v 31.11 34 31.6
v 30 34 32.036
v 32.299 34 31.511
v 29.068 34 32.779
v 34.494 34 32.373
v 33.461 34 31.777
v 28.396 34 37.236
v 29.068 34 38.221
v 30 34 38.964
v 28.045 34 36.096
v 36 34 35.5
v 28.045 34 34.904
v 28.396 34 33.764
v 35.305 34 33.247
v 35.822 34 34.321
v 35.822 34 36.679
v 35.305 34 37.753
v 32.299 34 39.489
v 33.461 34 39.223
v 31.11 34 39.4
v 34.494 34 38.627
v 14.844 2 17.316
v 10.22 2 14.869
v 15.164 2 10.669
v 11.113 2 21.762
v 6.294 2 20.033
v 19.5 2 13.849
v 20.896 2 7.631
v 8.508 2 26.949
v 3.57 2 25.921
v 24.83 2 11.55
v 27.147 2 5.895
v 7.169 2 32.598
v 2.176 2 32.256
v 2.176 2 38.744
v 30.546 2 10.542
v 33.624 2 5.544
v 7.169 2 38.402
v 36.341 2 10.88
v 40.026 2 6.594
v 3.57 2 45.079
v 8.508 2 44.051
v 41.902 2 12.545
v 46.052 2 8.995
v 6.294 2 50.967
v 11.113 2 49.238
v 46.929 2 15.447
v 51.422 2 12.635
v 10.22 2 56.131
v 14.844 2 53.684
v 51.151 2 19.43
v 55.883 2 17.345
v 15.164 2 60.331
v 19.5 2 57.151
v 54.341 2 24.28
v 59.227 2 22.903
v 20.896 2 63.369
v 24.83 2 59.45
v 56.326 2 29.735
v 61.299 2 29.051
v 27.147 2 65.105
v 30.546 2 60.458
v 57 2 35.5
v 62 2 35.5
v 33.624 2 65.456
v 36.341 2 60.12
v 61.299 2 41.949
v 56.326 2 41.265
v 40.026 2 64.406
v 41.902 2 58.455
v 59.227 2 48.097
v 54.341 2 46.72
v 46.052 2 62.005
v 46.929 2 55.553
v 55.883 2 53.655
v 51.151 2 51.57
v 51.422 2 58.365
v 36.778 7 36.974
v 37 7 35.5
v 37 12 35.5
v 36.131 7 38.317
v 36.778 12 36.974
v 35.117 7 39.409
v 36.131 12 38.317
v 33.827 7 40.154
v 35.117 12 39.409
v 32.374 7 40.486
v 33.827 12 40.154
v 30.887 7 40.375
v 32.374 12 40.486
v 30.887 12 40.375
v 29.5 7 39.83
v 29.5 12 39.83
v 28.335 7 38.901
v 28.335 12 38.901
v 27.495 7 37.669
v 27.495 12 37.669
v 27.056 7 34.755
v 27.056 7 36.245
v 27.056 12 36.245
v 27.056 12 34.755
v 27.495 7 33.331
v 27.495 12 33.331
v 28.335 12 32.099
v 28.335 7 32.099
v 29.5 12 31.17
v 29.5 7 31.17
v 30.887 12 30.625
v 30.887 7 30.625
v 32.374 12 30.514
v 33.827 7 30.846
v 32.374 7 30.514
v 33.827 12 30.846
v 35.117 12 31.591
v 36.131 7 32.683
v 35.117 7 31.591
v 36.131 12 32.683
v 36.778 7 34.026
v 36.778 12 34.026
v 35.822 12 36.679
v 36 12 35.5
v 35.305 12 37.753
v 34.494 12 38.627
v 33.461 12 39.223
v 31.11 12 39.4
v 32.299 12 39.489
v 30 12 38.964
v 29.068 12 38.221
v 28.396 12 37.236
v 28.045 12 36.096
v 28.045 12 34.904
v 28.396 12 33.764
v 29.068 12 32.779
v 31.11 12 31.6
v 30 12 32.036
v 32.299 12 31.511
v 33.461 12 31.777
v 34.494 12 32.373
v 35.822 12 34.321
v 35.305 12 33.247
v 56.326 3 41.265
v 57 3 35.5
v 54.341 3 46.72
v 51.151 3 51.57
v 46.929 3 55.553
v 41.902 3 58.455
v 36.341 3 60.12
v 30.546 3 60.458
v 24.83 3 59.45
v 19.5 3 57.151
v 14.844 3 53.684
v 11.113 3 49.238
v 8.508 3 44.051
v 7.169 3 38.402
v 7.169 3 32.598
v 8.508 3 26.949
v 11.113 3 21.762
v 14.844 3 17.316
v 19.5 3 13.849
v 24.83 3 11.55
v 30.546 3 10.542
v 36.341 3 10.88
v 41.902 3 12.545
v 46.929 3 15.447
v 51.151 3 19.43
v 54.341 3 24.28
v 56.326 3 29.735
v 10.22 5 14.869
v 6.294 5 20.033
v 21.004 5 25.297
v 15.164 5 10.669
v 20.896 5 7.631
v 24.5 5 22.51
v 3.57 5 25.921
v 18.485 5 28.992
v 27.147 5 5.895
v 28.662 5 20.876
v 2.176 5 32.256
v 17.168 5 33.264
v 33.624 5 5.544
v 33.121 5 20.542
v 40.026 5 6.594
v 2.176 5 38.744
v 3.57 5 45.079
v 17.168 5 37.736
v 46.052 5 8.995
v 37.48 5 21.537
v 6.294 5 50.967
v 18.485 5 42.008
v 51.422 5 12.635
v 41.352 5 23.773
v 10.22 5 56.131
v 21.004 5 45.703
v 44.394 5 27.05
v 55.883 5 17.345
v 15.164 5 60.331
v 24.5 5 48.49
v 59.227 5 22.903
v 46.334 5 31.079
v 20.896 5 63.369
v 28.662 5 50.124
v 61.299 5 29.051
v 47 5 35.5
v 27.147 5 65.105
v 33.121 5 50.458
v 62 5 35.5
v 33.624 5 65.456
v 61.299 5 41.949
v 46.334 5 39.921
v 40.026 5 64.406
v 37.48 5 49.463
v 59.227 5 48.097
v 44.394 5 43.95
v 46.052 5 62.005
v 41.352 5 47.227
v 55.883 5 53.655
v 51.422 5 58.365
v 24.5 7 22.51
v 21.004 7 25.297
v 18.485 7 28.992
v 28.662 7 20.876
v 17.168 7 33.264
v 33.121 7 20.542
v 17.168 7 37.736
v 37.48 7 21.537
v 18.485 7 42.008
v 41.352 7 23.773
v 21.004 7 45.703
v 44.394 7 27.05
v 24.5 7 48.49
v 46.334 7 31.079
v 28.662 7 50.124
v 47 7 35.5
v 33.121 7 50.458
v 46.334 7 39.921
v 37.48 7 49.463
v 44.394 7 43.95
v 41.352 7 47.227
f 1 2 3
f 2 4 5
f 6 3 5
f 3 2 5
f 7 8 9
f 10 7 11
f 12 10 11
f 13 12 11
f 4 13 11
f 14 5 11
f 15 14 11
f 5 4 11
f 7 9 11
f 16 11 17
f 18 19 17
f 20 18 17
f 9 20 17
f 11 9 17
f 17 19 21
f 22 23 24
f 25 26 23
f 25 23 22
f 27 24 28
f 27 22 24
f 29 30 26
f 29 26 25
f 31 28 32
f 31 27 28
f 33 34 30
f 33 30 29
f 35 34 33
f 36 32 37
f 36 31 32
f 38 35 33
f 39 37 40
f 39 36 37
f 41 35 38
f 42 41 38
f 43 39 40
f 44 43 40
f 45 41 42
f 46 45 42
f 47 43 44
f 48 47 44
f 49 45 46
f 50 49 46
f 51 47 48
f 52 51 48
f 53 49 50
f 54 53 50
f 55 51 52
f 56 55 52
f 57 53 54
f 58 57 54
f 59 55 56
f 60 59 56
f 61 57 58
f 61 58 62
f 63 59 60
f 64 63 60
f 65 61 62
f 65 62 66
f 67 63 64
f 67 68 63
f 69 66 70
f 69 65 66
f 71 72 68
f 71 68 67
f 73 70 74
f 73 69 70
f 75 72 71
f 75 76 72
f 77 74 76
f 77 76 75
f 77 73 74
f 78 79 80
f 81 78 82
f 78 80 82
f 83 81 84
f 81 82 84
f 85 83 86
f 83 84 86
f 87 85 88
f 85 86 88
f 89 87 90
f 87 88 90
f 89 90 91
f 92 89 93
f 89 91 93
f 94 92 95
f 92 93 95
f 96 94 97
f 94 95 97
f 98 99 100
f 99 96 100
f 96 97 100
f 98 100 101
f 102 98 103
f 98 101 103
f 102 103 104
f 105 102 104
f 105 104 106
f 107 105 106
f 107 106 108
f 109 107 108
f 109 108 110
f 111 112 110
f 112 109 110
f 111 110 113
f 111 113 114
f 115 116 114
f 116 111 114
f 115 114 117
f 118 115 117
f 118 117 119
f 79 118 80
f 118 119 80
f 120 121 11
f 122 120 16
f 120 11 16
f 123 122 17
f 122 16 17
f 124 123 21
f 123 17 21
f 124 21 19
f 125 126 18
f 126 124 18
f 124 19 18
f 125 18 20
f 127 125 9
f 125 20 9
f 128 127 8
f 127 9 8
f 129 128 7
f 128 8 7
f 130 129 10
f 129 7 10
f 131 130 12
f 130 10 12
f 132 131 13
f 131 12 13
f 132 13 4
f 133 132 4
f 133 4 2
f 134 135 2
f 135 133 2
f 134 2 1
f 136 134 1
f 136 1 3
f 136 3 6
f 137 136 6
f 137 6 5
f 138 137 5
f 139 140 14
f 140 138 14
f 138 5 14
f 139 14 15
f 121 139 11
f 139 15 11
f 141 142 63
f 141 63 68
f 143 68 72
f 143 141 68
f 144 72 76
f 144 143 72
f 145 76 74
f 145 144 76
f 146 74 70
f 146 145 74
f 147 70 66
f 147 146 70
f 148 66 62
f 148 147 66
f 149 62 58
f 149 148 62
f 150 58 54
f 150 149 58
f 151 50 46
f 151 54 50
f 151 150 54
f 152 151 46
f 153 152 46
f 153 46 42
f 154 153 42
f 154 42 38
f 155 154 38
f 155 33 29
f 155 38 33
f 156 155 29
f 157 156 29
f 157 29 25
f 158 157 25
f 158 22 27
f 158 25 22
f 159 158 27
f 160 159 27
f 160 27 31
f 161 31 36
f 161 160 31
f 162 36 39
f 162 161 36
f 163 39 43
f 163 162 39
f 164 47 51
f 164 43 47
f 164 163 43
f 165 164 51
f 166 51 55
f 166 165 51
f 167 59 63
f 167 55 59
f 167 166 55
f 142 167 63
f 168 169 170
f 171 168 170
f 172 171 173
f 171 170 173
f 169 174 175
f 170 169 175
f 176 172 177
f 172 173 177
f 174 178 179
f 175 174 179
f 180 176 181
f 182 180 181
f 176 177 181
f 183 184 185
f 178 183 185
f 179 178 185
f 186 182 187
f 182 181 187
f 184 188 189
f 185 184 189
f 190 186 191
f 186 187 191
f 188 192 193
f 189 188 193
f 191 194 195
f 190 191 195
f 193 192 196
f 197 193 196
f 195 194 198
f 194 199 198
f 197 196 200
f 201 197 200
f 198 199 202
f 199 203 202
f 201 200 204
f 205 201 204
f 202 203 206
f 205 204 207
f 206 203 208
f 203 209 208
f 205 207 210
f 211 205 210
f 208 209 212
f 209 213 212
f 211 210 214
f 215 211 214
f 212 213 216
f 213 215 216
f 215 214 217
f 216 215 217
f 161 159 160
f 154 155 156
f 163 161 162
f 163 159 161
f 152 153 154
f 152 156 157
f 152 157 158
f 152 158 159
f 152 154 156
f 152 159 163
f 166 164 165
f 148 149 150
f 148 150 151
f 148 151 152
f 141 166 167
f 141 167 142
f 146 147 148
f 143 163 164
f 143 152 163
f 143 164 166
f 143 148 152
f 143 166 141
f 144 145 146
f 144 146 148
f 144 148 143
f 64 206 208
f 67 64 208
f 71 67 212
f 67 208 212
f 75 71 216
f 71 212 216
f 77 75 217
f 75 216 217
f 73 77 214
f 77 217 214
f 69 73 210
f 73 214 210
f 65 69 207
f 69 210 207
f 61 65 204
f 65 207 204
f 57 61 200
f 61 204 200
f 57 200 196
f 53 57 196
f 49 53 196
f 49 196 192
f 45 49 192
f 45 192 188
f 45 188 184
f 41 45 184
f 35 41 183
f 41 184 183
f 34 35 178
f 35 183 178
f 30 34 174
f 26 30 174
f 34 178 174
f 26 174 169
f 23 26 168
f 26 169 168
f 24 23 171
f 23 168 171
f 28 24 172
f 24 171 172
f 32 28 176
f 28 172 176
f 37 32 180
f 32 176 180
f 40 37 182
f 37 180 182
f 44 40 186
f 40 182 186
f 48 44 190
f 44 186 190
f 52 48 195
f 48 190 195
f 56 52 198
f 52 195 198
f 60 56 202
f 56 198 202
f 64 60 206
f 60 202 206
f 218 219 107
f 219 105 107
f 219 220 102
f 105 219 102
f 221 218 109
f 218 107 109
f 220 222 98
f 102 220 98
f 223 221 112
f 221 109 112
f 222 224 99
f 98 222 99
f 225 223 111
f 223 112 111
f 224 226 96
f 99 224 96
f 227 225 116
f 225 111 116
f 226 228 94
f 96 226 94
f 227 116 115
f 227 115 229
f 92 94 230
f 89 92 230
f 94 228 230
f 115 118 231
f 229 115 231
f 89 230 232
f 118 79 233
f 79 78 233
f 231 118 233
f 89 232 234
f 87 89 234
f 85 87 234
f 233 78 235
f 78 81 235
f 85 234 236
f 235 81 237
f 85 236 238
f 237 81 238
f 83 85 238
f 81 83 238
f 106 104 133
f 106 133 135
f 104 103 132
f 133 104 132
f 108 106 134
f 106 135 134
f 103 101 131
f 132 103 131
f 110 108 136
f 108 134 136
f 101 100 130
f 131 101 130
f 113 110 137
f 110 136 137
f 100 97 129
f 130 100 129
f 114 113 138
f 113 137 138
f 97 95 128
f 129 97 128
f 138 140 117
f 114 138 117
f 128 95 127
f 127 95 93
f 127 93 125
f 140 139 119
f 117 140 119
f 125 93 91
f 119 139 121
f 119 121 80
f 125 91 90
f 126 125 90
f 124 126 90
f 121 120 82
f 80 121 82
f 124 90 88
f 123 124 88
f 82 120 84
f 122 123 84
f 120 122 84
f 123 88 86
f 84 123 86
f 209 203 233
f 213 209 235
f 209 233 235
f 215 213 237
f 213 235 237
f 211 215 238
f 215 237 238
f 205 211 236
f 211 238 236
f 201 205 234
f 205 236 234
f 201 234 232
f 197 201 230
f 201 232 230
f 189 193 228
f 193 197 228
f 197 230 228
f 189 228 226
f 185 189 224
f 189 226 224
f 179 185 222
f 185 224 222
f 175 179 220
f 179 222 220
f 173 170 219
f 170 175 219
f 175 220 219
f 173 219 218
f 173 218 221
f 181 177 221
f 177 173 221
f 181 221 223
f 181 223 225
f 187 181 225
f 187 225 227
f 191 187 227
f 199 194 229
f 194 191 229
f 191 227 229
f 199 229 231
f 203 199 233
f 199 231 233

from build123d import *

# Parameters (mm, degrees)
CYLINDER006_R          = 25
CYLINDER006_DEPTH      = 3
CYLINDER006_ROLL_ANGLE = 90
CYLINDER003_R          = 5
CYLINDER003_DEPTH      = 11
CYLINDER003_ROLL_ANGLE = 90
CYLINDER005_R          = 30
CYLINDER005_DEPTH      = 3
CYLINDER005_ROLL_ANGLE = 90
CYLINDER004_R          = 15
CYLINDER004_DEPTH      = 4
CYLINDER004_ROLL_ANGLE = 90
CYLINDER002_R          = 4
CYLINDER002_DEPTH      = 32
CYLINDER002_ROLL_ANGLE = 90


with BuildPart() as bein004:
    # Cylinder006 → Cylinder006 (new body)
    with BuildSketch(Plane.XY):
        Circle(CYLINDER006_R)
    extrude(amount=CYLINDER006_DEPTH)


with BuildPart() as bein004_1:
    # Cylinder006 roll: moved
    add(bein004.part.rotate(Axis((0, 0, 0), (1, 0, 0)), CYLINDER006_ROLL_ANGLE))


with BuildPart() as bein004_2:
    # Cylinder006 placement: moved
    add(bein004_1.part.moved(Location((32, 3, 35.5))))


with BuildPart() as bein001:
    # Cylinder003 → Cylinder003 (new body)
    with BuildSketch(Plane.XY):
        Circle(CYLINDER003_R)
    extrude(amount=CYLINDER003_DEPTH)


with BuildPart() as bein001_1:
    # Cylinder003 roll: moved
    add(bein001.part.rotate(Axis((0, 0, 0), (1, 0, 0)), CYLINDER003_ROLL_ANGLE))


with BuildPart() as bein001_2:
    # Cylinder003 placement: moved
    add(bein001_1.part.moved(Location((32, 12, 35.5))))


with BuildPart() as bein003:
    # Cylinder005 → Cylinder005 (new body)
    with BuildSketch(Plane.XY):
        Circle(CYLINDER005_R)
    extrude(amount=CYLINDER005_DEPTH)


with BuildPart() as bein003_1:
    # Cylinder005 roll: moved
    add(bein003.part.rotate(Axis((0, 0, 0), (1, 0, 0)), CYLINDER005_ROLL_ANGLE))


with BuildPart() as bein003_2:
    # Cylinder005 placement: moved
    add(bein003_1.part.moved(Location((32, 5, 35.5))))


with BuildPart() as bein002:
    # Cylinder004 → Cylinder004 (new body)
    with BuildSketch(Plane.XY):
        Circle(CYLINDER004_R)
    extrude(amount=CYLINDER004_DEPTH)


with BuildPart() as bein002_1:
    # Cylinder004 roll: moved
    add(bein002.part.rotate(Axis((0, 0, 0), (1, 0, 0)), CYLINDER004_ROLL_ANGLE))


with BuildPart() as bein002_2:
    # Cylinder004 placement: moved
    add(bein002_1.part.moved(Location((32, 7, 35.5))))


with BuildPart() as cut002:
    # Cylinder002 → Cylinder002 (new body)
    with BuildSketch(Plane.XY):
        Circle(CYLINDER002_R)
    extrude(amount=CYLINDER002_DEPTH)


with BuildPart() as cut002_1:
    # Cylinder002 roll: moved
    add(cut002.part.rotate(Axis((0, 0, 0), (1, 0, 0)), CYLINDER002_ROLL_ANGLE))


with BuildPart() as cut002_2:
    # Cylinder002 placement: moved
    add(cut002_1.part.moved(Location((32, 34, 35.5))))

    # Fusion002: union bein001, bein003, bein002
    add(bein001_2.part)
    add(bein003_2.part)
    add(bein002_2.part)

    # Cut002: cut bein004
    add(bein004_2.part, mode=Mode.SUBTRACT)


solid = cut002_2.part
